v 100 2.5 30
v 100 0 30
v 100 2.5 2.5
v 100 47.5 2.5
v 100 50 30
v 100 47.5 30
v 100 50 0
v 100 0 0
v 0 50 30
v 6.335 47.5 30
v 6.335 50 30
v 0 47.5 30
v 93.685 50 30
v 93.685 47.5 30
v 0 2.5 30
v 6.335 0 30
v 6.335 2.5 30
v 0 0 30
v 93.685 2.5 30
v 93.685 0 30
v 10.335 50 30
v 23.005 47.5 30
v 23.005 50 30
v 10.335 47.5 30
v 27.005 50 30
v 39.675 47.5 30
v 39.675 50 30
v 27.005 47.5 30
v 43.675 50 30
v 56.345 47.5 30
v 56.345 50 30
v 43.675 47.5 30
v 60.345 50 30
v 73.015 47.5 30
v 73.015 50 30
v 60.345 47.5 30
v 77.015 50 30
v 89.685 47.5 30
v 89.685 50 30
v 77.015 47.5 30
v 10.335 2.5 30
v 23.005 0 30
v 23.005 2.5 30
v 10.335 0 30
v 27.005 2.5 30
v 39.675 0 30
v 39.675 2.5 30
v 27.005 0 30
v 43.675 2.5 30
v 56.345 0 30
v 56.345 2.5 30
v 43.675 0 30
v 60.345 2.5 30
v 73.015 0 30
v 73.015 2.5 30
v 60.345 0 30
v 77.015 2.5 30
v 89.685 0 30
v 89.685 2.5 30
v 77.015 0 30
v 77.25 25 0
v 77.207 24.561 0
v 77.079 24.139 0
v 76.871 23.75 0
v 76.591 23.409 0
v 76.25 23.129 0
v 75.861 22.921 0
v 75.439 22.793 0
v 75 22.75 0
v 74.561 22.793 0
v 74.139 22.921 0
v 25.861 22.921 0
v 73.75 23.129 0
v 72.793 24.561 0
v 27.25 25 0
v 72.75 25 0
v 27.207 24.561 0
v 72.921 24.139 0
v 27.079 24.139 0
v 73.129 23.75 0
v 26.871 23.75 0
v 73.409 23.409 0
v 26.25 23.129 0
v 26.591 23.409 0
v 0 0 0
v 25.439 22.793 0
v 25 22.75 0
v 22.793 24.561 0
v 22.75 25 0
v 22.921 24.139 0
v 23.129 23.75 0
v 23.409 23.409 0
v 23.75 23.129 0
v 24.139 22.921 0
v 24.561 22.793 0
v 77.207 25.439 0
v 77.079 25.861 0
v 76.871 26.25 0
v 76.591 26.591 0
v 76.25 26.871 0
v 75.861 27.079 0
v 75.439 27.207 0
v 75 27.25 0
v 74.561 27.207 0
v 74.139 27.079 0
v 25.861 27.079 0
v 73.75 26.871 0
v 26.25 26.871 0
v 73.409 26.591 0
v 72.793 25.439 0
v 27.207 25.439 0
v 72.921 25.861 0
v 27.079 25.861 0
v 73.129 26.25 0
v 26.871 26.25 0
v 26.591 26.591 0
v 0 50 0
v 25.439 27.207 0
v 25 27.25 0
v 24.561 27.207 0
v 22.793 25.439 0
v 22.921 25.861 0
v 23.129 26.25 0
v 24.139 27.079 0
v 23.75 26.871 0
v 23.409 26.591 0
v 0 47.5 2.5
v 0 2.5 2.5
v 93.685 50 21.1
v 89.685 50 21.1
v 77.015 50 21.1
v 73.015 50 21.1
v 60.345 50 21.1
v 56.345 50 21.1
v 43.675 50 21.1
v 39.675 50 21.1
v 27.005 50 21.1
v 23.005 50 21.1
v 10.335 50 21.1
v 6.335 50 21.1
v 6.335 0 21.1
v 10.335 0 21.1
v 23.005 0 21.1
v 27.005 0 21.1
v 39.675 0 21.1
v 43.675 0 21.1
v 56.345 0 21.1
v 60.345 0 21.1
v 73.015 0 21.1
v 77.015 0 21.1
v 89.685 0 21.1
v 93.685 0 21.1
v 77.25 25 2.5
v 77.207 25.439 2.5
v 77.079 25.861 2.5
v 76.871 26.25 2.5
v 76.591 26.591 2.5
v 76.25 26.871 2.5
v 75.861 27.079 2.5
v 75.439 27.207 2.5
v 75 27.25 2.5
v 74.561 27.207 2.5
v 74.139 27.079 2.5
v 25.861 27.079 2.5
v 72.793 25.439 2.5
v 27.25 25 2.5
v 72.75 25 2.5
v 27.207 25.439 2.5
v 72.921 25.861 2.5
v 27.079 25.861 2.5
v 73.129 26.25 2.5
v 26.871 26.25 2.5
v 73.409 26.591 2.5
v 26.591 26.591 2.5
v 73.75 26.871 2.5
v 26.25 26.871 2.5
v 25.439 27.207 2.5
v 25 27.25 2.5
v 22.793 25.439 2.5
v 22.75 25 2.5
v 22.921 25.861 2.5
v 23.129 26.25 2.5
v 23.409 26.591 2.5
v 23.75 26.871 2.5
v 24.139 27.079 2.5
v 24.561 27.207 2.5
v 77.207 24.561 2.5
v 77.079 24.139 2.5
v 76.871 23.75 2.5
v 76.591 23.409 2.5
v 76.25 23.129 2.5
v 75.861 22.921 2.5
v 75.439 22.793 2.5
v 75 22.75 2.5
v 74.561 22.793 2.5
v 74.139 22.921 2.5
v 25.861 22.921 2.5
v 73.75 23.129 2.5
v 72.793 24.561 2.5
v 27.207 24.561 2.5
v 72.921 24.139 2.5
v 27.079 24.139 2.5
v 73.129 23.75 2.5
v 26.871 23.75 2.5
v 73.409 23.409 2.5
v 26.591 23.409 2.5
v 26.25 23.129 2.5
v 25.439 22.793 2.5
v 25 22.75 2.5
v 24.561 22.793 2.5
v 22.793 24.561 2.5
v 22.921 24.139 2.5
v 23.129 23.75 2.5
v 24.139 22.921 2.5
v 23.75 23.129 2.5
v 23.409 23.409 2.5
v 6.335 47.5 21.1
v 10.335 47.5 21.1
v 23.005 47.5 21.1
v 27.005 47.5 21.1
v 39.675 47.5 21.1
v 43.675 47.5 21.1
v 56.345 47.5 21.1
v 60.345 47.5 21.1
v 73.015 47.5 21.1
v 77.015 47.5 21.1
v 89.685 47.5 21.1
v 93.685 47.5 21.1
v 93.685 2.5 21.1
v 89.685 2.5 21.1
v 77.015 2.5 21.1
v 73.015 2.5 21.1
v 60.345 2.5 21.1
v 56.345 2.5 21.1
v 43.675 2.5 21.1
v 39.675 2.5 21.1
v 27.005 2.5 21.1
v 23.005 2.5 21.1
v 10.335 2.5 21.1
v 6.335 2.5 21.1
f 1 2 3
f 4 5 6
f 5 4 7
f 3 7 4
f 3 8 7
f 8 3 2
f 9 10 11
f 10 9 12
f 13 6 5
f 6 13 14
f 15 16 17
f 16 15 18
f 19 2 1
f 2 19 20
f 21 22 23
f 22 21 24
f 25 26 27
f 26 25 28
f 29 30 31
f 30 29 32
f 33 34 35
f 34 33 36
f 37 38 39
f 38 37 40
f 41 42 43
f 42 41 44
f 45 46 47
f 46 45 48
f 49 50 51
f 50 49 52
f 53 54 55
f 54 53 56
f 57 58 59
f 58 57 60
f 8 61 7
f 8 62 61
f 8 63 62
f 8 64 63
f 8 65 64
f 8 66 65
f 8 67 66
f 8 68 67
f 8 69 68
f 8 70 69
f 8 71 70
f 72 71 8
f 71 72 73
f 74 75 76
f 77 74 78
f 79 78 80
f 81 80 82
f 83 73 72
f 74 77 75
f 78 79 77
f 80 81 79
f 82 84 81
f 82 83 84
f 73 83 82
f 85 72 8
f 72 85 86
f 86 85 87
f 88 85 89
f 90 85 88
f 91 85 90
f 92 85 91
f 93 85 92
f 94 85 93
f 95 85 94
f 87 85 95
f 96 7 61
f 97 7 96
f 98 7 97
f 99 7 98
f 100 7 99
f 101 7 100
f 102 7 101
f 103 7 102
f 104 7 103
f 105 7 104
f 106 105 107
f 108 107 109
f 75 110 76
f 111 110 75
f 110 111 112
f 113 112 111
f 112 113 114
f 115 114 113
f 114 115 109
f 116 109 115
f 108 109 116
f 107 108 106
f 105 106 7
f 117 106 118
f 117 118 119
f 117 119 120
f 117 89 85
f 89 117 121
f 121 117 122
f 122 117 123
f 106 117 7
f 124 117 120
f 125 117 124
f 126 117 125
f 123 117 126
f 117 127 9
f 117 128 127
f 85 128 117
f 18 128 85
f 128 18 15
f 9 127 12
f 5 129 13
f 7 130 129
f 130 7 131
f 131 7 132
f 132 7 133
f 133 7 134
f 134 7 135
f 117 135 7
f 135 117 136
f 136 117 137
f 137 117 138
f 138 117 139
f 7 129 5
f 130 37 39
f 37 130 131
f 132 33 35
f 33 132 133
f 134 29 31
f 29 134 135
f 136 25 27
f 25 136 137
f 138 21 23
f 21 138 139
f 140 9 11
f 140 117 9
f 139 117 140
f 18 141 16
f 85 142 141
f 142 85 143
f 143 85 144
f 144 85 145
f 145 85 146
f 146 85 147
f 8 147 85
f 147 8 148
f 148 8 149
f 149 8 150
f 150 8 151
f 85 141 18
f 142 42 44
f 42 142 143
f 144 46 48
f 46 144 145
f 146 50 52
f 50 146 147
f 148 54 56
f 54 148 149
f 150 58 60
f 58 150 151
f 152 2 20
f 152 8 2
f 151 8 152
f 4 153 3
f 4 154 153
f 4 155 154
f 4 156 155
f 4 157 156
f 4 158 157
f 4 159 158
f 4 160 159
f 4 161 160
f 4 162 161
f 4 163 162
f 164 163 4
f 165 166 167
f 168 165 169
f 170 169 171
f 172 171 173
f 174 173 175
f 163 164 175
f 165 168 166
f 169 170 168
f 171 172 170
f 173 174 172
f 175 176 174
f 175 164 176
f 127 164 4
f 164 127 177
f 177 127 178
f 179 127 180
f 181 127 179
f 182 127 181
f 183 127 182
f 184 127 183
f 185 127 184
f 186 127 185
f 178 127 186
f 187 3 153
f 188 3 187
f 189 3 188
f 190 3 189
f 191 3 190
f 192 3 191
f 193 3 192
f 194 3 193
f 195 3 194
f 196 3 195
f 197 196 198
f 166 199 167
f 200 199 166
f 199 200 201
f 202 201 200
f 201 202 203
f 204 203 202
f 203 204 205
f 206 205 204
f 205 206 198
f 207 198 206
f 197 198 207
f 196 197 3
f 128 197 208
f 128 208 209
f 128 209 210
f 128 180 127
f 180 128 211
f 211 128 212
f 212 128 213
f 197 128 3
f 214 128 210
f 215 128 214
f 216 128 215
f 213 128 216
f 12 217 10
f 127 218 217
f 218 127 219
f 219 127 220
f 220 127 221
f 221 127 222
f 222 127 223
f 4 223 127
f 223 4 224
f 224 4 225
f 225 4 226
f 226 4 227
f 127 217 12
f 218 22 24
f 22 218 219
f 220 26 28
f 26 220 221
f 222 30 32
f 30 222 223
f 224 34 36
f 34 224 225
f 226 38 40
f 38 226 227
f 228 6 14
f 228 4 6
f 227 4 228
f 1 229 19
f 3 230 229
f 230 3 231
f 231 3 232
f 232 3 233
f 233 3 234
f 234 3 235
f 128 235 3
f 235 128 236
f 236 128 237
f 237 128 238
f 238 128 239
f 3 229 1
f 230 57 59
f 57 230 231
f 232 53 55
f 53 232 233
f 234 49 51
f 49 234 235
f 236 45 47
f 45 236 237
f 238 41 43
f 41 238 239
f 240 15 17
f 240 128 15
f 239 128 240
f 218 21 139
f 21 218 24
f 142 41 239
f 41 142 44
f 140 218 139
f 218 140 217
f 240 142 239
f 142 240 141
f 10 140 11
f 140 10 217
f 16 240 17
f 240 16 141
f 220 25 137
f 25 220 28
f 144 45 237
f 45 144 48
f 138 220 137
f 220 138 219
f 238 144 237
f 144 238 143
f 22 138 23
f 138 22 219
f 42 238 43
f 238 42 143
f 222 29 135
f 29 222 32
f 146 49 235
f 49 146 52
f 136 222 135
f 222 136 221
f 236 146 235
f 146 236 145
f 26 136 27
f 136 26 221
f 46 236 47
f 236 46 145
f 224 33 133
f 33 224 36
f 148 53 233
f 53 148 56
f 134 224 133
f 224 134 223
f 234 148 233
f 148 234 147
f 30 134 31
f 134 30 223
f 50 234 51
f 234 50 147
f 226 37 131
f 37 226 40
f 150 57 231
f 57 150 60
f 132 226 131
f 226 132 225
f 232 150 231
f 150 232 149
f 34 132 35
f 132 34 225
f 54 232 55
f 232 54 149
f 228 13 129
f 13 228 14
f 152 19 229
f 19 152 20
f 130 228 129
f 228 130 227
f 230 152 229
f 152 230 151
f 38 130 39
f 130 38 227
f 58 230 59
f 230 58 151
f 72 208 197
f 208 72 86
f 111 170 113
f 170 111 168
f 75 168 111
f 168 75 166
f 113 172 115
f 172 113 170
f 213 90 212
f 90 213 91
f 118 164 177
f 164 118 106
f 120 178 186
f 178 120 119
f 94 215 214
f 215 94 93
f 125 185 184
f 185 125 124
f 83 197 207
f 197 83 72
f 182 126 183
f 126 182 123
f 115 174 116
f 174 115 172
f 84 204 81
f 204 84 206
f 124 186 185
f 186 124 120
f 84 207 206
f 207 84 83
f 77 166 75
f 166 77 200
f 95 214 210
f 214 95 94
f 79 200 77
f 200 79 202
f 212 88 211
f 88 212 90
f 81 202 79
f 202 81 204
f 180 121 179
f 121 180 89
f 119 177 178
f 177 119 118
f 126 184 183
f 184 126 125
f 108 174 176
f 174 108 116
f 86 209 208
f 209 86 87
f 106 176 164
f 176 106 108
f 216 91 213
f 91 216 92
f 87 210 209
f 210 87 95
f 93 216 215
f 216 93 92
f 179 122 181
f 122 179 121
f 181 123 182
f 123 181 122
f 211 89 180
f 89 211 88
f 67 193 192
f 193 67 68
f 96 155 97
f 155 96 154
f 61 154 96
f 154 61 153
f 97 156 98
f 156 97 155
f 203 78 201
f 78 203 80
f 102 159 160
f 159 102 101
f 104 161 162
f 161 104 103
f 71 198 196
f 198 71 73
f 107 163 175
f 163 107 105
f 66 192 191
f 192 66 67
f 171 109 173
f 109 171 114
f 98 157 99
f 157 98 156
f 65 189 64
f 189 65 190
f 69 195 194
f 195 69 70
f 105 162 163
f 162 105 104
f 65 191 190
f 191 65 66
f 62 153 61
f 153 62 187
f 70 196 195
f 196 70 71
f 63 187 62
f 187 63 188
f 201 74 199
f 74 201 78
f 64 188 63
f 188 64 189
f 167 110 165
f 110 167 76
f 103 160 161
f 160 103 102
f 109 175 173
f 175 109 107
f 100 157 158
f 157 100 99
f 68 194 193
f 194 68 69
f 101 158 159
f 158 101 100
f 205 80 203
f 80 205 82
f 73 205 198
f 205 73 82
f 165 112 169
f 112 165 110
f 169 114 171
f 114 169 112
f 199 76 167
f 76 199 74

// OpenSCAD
$fn = 32;

// ----------------------------------------------------------------------
// Cable duct: 100 x 50 x 30 mm, 6 fingers
// ----------------------------------------------------------------------

// --- parameters (mm) ---
duct_len = 100;           // duct length, X
duct_w = 50;              // duct width, Y
duct_h = 30;              // duct height, Z
wall_t = 2.5;             // side wall thickness
floor_t = 2.5;            // floor thickness
slot_w = 4;               // finger slot width
slot_h = 18.6;            // finger slot height
fingers = 6;              // number of finger slots per side
pitch = 16.67;            // finger pitch
hole_d = 4.5;             // floor mounting hole
hole_n = 2;               // mounting holes in the floor

module shell() {
  difference() {
    cube([duct_len, duct_w, duct_h]);
    /* open top channel */
    translate([-wall_t - 1, wall_t, floor_t])
      cube([duct_len + 2 * wall_t + 2, duct_w - 2 * wall_t, duct_h + 1]);
  }
}

difference() {
  union() {
    shell();
  }
  /* finger slots cut through both side walls */
  for (i = [0 : fingers - 1]) translate([pitch / 2 + i * pitch - slot_w / 2, -1, floor_t + slot_h]) cube([slot_w, duct_w + 2, duct_h]);
  for (i = [0 : hole_n - 1]) translate([(duct_len / hole_n) * (i + 0.5), duct_w / 2, -1]) cylinder(h = floor_t + 2, d = hole_d);
}
